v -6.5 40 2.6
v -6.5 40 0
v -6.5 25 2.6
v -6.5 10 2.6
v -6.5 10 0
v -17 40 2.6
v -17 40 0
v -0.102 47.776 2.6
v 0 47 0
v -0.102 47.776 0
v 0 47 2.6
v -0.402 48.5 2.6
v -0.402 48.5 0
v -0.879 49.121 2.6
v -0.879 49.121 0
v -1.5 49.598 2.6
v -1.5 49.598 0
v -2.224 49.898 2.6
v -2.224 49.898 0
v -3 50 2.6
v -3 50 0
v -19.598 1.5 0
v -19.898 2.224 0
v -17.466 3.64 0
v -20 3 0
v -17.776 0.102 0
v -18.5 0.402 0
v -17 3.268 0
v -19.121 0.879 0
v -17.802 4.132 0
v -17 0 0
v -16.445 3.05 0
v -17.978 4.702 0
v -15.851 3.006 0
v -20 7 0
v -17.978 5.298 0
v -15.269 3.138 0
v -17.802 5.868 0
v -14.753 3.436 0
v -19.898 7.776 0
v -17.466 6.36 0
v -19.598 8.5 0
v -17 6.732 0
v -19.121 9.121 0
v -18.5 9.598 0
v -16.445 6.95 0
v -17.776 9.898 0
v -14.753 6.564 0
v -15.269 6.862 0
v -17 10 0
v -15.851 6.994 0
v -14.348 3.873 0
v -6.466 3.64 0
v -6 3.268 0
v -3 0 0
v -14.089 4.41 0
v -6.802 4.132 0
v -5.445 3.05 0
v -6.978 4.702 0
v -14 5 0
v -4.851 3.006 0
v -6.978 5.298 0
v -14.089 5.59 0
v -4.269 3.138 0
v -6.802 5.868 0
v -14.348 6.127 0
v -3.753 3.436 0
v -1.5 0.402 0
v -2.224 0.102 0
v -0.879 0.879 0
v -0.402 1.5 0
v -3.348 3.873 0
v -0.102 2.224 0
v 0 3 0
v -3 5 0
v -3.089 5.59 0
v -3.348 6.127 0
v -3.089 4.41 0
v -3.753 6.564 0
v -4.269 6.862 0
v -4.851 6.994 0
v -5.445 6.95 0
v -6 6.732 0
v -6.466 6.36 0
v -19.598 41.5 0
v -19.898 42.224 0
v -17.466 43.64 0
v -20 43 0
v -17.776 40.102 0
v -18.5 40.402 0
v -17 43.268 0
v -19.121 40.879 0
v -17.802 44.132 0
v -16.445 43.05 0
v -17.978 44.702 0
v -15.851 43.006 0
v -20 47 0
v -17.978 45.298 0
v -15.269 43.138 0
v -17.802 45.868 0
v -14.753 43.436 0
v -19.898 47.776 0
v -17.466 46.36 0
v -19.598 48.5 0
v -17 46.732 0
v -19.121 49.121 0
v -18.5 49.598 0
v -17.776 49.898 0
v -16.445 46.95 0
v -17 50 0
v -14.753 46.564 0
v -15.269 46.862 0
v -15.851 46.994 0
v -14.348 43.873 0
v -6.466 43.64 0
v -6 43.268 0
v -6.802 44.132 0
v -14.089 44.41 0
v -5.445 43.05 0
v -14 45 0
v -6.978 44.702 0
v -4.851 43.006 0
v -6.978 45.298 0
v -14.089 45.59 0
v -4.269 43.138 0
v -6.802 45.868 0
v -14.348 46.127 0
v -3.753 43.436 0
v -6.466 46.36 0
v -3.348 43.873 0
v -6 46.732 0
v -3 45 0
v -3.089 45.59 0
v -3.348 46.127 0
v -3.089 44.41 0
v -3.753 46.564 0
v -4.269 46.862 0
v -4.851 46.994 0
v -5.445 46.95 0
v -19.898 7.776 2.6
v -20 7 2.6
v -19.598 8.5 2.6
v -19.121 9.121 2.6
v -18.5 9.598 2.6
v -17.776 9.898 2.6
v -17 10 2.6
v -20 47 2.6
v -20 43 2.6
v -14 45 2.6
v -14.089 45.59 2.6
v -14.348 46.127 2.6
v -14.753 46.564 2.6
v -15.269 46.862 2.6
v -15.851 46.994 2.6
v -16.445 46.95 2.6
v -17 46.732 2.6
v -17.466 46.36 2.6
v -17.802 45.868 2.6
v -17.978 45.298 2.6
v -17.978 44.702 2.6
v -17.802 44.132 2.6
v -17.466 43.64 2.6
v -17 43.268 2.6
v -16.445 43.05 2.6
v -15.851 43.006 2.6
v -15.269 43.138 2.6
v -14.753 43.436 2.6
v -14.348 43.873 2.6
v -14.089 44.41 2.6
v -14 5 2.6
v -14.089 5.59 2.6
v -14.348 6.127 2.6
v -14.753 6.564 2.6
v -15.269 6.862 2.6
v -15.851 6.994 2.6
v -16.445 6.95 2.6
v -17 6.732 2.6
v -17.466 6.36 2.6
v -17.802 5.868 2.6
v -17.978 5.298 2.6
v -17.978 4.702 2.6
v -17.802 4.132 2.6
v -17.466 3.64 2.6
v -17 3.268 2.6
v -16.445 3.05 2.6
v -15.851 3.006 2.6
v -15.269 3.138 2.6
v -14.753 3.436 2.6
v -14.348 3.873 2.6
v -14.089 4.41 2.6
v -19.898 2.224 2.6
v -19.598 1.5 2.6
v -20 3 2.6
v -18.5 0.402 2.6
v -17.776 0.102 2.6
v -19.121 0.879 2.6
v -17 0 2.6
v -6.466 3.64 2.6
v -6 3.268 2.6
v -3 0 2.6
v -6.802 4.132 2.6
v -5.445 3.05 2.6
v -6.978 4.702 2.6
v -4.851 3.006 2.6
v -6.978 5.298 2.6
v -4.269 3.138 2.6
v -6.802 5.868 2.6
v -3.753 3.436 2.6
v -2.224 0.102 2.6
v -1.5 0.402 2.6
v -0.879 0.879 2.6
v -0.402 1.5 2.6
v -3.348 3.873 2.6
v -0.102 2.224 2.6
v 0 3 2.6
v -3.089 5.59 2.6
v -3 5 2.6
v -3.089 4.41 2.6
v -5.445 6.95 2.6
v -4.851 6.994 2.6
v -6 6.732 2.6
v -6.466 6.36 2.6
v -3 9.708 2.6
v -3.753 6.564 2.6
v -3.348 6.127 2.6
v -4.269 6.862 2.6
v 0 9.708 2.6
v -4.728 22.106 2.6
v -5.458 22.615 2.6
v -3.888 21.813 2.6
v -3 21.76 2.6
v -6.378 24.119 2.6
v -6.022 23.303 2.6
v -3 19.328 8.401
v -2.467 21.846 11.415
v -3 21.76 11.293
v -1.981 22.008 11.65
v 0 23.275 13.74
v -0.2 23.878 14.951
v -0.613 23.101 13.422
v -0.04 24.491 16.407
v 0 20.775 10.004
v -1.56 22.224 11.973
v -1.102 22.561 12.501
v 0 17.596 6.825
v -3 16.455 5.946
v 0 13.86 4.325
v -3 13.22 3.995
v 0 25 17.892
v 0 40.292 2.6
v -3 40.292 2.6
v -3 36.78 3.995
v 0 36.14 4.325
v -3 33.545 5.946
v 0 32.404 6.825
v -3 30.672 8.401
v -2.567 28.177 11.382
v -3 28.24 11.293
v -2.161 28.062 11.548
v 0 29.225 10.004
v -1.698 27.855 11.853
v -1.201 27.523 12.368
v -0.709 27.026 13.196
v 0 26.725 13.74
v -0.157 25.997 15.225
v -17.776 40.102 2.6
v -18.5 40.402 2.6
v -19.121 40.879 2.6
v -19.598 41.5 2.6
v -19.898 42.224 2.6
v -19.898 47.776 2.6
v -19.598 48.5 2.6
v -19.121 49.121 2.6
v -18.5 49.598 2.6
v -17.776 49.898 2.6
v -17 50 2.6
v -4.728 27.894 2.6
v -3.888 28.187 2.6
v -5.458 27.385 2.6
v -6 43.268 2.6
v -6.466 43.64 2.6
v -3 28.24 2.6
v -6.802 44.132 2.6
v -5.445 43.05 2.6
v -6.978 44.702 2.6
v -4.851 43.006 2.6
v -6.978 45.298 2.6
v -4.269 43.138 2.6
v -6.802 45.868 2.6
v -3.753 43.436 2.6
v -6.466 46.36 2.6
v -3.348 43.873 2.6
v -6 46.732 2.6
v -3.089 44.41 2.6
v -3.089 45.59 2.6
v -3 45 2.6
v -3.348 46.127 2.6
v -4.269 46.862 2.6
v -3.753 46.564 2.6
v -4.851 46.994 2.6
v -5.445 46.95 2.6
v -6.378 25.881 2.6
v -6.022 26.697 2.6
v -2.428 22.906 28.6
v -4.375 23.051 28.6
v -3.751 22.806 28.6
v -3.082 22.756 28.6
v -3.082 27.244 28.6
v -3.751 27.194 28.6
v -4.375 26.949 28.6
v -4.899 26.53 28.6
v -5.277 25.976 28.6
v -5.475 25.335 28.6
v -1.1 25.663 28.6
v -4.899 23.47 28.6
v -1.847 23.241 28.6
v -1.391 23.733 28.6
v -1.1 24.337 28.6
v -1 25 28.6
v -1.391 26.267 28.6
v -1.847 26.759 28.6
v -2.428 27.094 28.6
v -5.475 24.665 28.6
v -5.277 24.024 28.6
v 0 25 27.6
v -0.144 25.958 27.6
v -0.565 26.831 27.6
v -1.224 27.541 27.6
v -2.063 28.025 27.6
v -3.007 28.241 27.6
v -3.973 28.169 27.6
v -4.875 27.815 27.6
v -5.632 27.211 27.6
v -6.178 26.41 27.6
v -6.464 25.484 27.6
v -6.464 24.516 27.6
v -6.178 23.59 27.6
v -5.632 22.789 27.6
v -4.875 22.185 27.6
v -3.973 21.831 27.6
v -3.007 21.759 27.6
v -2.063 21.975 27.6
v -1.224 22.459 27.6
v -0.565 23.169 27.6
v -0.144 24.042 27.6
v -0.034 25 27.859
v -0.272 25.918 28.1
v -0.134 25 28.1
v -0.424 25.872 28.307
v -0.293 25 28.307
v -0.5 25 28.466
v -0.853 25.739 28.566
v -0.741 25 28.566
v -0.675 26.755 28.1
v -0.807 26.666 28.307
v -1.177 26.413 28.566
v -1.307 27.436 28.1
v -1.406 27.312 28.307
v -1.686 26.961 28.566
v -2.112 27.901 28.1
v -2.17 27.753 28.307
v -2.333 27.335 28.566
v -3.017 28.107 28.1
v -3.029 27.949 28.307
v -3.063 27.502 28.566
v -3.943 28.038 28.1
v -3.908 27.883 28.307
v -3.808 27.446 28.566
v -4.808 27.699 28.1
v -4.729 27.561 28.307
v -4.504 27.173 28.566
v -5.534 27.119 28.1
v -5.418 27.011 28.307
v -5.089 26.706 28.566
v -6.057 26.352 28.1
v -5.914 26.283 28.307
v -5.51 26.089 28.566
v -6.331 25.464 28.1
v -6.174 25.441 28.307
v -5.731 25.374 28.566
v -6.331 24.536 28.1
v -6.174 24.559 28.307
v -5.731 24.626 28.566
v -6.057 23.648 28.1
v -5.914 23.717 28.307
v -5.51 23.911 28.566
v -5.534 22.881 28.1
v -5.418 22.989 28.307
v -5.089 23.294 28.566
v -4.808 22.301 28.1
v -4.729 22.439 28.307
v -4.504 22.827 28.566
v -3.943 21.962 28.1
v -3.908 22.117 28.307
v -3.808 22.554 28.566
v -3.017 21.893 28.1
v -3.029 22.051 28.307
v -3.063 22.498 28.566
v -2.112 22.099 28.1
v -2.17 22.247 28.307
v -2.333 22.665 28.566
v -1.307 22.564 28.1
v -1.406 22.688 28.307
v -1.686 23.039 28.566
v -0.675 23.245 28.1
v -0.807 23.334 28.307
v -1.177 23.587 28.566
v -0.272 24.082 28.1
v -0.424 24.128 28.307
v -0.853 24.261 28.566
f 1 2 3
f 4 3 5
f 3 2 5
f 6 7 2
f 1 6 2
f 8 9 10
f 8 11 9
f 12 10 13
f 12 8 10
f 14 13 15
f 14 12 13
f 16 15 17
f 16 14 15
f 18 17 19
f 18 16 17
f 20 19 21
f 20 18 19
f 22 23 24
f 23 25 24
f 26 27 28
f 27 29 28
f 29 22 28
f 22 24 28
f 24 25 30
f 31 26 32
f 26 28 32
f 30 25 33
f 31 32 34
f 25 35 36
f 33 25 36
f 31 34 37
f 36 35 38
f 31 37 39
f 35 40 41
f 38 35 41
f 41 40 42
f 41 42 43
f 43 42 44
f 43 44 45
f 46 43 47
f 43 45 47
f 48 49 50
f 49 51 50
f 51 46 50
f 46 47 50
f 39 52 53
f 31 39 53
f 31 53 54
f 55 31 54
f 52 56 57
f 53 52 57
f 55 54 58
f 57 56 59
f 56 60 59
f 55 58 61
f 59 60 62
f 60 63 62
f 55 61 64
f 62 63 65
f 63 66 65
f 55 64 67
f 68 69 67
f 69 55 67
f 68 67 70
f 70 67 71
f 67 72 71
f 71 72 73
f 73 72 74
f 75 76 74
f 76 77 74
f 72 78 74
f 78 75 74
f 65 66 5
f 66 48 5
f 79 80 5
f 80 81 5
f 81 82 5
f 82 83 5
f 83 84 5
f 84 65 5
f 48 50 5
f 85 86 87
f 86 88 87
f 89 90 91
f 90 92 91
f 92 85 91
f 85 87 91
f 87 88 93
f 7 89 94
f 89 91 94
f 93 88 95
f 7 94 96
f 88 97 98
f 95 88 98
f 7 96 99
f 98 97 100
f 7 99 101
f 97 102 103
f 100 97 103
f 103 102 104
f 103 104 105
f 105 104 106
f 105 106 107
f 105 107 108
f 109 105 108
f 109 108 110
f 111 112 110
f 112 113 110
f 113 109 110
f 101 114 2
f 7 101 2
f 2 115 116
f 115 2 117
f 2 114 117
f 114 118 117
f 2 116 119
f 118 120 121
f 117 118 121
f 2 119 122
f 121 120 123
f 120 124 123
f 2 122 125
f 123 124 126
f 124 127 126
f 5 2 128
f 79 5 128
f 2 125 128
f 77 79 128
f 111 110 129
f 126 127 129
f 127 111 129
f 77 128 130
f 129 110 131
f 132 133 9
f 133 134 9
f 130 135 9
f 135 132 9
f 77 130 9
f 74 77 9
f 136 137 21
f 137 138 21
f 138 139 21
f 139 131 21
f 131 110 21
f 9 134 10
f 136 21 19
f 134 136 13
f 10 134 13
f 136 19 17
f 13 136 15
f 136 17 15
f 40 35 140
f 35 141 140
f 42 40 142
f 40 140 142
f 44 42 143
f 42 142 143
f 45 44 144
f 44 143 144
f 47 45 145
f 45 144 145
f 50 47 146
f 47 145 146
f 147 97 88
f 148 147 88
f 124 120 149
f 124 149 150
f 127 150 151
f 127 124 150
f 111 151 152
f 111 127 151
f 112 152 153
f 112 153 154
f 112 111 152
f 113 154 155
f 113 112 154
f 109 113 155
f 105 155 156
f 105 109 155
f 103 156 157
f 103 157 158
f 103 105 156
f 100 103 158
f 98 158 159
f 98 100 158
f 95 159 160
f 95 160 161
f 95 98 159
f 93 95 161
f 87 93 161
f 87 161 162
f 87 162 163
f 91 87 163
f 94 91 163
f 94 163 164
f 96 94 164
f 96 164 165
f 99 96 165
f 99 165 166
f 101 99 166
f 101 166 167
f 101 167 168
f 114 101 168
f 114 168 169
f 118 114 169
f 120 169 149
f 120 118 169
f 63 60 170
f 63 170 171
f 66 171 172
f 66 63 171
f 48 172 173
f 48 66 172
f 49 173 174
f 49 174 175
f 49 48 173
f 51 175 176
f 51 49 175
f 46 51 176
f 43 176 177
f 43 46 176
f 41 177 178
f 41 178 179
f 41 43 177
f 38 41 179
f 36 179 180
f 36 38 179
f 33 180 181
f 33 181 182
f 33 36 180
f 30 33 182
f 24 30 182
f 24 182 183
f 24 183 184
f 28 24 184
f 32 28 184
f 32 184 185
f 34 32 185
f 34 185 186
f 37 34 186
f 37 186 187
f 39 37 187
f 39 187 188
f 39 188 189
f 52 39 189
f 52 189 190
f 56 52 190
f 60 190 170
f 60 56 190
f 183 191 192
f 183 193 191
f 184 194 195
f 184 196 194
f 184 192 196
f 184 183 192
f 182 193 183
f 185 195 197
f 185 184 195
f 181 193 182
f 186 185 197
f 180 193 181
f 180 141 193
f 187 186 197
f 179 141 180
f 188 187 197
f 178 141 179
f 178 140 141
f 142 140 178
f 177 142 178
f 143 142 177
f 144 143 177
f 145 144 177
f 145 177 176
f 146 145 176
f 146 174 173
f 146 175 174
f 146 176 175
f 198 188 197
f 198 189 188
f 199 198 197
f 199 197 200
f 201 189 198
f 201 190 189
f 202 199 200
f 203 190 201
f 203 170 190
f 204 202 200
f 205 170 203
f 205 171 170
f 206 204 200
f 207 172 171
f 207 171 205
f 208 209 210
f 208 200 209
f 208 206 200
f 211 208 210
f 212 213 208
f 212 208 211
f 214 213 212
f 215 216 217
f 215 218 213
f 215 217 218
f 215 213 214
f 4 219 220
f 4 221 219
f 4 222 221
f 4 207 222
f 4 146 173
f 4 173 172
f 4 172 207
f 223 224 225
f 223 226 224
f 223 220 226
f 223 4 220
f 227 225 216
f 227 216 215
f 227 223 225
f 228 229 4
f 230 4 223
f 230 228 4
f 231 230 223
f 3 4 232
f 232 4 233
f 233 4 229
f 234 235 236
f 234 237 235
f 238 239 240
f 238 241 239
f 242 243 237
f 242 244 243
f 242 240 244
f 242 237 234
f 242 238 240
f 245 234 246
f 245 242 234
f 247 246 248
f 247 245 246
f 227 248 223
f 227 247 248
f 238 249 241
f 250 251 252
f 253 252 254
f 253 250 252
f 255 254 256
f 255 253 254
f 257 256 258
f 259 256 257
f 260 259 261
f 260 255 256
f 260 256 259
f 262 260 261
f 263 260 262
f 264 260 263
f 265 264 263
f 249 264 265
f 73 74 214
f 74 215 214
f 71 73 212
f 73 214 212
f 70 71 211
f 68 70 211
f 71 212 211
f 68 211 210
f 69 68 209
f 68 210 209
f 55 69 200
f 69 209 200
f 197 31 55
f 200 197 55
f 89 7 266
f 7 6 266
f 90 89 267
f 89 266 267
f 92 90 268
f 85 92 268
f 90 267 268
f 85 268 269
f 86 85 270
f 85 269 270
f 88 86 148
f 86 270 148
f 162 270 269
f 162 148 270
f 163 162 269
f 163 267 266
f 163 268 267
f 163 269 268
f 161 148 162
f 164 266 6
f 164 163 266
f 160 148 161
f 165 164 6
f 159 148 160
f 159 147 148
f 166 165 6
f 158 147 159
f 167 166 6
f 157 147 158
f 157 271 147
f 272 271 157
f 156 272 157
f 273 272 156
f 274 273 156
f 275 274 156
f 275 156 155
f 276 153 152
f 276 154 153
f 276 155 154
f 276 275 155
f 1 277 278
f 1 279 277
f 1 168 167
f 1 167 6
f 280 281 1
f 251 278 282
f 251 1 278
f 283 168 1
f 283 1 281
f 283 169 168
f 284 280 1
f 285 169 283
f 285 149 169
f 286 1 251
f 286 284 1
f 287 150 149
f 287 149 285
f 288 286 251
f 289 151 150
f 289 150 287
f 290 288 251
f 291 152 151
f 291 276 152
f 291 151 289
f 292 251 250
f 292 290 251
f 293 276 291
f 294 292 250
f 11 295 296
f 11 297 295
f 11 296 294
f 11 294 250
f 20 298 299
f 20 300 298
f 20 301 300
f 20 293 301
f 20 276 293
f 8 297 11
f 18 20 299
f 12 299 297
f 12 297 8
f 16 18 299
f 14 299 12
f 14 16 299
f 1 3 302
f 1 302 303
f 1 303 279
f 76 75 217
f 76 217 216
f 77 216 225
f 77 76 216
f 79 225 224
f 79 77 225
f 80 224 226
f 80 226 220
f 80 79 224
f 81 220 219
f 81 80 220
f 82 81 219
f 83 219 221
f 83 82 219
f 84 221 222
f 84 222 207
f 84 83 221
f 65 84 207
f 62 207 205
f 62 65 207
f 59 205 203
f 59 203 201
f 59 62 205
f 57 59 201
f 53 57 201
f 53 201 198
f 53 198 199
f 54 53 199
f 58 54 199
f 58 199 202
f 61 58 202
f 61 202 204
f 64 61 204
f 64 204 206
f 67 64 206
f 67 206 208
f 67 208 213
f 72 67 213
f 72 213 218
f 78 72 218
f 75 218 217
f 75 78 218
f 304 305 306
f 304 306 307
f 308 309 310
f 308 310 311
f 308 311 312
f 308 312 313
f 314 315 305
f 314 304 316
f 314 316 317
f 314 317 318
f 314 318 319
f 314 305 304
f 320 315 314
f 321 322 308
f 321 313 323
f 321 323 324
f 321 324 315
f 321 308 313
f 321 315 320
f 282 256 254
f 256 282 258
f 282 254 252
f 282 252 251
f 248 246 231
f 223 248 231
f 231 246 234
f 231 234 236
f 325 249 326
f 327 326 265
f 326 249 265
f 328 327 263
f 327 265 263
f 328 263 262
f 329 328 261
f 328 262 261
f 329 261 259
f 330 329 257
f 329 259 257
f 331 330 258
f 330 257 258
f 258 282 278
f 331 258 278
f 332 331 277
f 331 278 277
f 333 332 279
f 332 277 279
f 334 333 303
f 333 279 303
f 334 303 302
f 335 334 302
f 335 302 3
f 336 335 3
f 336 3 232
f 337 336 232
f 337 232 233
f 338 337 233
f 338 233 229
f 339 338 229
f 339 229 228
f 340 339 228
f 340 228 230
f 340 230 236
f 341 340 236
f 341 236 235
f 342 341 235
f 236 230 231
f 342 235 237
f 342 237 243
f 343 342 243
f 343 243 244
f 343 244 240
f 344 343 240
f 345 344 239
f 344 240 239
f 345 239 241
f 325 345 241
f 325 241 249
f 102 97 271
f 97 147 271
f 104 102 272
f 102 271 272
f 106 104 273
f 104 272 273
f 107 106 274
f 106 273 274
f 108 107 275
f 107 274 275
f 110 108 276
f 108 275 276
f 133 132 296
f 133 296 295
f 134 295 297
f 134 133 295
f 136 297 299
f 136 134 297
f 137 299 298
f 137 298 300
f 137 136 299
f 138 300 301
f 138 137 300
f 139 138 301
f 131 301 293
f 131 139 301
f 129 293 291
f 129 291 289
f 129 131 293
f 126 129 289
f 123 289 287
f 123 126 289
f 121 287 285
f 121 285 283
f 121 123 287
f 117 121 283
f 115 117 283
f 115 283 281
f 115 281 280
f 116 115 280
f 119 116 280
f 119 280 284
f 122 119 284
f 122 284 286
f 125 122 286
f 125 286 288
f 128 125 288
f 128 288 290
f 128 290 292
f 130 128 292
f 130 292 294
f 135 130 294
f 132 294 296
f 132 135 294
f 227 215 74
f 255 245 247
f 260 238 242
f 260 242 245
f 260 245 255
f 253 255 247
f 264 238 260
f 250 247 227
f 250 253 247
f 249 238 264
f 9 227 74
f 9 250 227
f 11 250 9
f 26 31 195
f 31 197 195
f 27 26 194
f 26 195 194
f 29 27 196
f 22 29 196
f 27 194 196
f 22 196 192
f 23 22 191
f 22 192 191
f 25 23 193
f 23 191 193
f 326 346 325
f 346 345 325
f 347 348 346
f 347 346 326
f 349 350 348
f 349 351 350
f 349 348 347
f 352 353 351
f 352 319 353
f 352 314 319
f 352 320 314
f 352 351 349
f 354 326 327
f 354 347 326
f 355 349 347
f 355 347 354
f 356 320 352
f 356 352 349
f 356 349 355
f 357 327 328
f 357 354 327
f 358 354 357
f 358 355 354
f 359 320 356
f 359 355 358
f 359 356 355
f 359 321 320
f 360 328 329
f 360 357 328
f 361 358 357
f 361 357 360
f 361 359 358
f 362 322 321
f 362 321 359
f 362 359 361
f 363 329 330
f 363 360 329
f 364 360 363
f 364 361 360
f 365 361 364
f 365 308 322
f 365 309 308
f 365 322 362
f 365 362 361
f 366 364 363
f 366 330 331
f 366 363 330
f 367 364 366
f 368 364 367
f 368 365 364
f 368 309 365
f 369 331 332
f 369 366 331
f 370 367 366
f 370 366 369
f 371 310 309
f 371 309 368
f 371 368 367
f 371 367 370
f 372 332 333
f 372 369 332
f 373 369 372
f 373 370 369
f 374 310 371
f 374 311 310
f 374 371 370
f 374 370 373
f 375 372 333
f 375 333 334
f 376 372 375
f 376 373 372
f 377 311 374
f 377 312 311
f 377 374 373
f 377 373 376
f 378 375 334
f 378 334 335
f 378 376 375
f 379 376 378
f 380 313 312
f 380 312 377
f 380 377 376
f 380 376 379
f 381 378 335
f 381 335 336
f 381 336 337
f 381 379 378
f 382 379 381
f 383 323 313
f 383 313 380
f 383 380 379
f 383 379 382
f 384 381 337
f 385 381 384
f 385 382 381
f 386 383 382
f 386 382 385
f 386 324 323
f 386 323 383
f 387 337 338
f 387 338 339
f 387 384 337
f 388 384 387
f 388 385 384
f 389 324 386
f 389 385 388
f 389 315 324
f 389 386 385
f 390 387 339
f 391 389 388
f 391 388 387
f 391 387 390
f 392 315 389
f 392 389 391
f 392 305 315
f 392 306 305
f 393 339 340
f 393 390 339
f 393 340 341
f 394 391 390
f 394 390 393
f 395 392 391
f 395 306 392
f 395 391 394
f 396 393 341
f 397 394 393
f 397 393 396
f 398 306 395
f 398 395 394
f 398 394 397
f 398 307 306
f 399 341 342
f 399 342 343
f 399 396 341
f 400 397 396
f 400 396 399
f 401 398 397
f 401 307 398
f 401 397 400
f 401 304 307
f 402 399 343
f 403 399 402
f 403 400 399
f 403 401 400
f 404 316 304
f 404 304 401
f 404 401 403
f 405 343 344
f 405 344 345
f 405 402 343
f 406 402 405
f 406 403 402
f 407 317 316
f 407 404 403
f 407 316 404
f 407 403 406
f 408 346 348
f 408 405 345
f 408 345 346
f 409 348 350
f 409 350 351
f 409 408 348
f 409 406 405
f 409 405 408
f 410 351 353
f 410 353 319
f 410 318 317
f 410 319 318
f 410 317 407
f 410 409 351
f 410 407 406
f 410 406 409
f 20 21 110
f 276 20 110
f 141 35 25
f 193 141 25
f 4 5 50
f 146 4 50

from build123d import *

# Parameters (mm, degrees)
F0_R     = 2
F1_DEPTH = 2.6
F2_R     = 3.25
F3_DEPTH = 26
F4_R     = 3
F6_DEPTH = 3
F7_R     = 1


with BuildPart() as f1:
    # F0 (on Top) → F1 (new body)
    with BuildSketch(Plane.XY):
        Polygon((0, 50), (-20, 50), (-20, 40), (-6.5, 40), (-6.5, 10), (-20, 10), (-20, 0), (0, 0), align=None)
        with Locations((-16, 5)):
            Circle(F0_R, mode=Mode.SUBTRACT)
        with Locations((-5, 5)):
            Circle(F0_R, mode=Mode.SUBTRACT)
        with Locations((-16, 45)):
            Circle(F0_R, mode=Mode.SUBTRACT)
        with Locations((-5, 45)):
            Circle(F0_R, mode=Mode.SUBTRACT)
    extrude(amount=F1_DEPTH)

    # F2 (on face) → F3 (join)
    with BuildSketch(Plane.XY.offset(2.6)):
        with Locations((-3.25, 25)):
            Circle(F2_R)
    extrude(amount=F3_DEPTH)

    # F4
    f4_edges = [f1.edges().sort_by_distance(p)[0] for p in [
        (-20, 50, 1.3),
        (-20, 40, 1.3),
        (-20, 10, 1.3),
        (-20, 0, 1.3),
        (0, 50, 1.3),
        (0, 0, 1.3),
    ]]
    fillet(f4_edges, radius=F4_R)

    # F5 (on face) → F6 (join)
    with BuildSketch(Plane.YZ):
        with BuildLine():
            ThreePointArc((25, 17.891796), (19.263456, 8.336544), (9.708204, 2.6))
            Line((9.708204, 2.6), (25, 2.6))
            Line((25, 2.6), (40.291796, 2.6))
            ThreePointArc((40.291796, 2.6), (30.736544, 8.336544), (25, 17.891796))
        make_face()
    extrude(amount=-F6_DEPTH)

    # F7
    f7_edges = [f1.edges().sort_by_distance(p)[0] for p in [
        (-6.5, 25, 28.6),
    ]]
    fillet(f7_edges, radius=F7_R)


solid = f1.part
